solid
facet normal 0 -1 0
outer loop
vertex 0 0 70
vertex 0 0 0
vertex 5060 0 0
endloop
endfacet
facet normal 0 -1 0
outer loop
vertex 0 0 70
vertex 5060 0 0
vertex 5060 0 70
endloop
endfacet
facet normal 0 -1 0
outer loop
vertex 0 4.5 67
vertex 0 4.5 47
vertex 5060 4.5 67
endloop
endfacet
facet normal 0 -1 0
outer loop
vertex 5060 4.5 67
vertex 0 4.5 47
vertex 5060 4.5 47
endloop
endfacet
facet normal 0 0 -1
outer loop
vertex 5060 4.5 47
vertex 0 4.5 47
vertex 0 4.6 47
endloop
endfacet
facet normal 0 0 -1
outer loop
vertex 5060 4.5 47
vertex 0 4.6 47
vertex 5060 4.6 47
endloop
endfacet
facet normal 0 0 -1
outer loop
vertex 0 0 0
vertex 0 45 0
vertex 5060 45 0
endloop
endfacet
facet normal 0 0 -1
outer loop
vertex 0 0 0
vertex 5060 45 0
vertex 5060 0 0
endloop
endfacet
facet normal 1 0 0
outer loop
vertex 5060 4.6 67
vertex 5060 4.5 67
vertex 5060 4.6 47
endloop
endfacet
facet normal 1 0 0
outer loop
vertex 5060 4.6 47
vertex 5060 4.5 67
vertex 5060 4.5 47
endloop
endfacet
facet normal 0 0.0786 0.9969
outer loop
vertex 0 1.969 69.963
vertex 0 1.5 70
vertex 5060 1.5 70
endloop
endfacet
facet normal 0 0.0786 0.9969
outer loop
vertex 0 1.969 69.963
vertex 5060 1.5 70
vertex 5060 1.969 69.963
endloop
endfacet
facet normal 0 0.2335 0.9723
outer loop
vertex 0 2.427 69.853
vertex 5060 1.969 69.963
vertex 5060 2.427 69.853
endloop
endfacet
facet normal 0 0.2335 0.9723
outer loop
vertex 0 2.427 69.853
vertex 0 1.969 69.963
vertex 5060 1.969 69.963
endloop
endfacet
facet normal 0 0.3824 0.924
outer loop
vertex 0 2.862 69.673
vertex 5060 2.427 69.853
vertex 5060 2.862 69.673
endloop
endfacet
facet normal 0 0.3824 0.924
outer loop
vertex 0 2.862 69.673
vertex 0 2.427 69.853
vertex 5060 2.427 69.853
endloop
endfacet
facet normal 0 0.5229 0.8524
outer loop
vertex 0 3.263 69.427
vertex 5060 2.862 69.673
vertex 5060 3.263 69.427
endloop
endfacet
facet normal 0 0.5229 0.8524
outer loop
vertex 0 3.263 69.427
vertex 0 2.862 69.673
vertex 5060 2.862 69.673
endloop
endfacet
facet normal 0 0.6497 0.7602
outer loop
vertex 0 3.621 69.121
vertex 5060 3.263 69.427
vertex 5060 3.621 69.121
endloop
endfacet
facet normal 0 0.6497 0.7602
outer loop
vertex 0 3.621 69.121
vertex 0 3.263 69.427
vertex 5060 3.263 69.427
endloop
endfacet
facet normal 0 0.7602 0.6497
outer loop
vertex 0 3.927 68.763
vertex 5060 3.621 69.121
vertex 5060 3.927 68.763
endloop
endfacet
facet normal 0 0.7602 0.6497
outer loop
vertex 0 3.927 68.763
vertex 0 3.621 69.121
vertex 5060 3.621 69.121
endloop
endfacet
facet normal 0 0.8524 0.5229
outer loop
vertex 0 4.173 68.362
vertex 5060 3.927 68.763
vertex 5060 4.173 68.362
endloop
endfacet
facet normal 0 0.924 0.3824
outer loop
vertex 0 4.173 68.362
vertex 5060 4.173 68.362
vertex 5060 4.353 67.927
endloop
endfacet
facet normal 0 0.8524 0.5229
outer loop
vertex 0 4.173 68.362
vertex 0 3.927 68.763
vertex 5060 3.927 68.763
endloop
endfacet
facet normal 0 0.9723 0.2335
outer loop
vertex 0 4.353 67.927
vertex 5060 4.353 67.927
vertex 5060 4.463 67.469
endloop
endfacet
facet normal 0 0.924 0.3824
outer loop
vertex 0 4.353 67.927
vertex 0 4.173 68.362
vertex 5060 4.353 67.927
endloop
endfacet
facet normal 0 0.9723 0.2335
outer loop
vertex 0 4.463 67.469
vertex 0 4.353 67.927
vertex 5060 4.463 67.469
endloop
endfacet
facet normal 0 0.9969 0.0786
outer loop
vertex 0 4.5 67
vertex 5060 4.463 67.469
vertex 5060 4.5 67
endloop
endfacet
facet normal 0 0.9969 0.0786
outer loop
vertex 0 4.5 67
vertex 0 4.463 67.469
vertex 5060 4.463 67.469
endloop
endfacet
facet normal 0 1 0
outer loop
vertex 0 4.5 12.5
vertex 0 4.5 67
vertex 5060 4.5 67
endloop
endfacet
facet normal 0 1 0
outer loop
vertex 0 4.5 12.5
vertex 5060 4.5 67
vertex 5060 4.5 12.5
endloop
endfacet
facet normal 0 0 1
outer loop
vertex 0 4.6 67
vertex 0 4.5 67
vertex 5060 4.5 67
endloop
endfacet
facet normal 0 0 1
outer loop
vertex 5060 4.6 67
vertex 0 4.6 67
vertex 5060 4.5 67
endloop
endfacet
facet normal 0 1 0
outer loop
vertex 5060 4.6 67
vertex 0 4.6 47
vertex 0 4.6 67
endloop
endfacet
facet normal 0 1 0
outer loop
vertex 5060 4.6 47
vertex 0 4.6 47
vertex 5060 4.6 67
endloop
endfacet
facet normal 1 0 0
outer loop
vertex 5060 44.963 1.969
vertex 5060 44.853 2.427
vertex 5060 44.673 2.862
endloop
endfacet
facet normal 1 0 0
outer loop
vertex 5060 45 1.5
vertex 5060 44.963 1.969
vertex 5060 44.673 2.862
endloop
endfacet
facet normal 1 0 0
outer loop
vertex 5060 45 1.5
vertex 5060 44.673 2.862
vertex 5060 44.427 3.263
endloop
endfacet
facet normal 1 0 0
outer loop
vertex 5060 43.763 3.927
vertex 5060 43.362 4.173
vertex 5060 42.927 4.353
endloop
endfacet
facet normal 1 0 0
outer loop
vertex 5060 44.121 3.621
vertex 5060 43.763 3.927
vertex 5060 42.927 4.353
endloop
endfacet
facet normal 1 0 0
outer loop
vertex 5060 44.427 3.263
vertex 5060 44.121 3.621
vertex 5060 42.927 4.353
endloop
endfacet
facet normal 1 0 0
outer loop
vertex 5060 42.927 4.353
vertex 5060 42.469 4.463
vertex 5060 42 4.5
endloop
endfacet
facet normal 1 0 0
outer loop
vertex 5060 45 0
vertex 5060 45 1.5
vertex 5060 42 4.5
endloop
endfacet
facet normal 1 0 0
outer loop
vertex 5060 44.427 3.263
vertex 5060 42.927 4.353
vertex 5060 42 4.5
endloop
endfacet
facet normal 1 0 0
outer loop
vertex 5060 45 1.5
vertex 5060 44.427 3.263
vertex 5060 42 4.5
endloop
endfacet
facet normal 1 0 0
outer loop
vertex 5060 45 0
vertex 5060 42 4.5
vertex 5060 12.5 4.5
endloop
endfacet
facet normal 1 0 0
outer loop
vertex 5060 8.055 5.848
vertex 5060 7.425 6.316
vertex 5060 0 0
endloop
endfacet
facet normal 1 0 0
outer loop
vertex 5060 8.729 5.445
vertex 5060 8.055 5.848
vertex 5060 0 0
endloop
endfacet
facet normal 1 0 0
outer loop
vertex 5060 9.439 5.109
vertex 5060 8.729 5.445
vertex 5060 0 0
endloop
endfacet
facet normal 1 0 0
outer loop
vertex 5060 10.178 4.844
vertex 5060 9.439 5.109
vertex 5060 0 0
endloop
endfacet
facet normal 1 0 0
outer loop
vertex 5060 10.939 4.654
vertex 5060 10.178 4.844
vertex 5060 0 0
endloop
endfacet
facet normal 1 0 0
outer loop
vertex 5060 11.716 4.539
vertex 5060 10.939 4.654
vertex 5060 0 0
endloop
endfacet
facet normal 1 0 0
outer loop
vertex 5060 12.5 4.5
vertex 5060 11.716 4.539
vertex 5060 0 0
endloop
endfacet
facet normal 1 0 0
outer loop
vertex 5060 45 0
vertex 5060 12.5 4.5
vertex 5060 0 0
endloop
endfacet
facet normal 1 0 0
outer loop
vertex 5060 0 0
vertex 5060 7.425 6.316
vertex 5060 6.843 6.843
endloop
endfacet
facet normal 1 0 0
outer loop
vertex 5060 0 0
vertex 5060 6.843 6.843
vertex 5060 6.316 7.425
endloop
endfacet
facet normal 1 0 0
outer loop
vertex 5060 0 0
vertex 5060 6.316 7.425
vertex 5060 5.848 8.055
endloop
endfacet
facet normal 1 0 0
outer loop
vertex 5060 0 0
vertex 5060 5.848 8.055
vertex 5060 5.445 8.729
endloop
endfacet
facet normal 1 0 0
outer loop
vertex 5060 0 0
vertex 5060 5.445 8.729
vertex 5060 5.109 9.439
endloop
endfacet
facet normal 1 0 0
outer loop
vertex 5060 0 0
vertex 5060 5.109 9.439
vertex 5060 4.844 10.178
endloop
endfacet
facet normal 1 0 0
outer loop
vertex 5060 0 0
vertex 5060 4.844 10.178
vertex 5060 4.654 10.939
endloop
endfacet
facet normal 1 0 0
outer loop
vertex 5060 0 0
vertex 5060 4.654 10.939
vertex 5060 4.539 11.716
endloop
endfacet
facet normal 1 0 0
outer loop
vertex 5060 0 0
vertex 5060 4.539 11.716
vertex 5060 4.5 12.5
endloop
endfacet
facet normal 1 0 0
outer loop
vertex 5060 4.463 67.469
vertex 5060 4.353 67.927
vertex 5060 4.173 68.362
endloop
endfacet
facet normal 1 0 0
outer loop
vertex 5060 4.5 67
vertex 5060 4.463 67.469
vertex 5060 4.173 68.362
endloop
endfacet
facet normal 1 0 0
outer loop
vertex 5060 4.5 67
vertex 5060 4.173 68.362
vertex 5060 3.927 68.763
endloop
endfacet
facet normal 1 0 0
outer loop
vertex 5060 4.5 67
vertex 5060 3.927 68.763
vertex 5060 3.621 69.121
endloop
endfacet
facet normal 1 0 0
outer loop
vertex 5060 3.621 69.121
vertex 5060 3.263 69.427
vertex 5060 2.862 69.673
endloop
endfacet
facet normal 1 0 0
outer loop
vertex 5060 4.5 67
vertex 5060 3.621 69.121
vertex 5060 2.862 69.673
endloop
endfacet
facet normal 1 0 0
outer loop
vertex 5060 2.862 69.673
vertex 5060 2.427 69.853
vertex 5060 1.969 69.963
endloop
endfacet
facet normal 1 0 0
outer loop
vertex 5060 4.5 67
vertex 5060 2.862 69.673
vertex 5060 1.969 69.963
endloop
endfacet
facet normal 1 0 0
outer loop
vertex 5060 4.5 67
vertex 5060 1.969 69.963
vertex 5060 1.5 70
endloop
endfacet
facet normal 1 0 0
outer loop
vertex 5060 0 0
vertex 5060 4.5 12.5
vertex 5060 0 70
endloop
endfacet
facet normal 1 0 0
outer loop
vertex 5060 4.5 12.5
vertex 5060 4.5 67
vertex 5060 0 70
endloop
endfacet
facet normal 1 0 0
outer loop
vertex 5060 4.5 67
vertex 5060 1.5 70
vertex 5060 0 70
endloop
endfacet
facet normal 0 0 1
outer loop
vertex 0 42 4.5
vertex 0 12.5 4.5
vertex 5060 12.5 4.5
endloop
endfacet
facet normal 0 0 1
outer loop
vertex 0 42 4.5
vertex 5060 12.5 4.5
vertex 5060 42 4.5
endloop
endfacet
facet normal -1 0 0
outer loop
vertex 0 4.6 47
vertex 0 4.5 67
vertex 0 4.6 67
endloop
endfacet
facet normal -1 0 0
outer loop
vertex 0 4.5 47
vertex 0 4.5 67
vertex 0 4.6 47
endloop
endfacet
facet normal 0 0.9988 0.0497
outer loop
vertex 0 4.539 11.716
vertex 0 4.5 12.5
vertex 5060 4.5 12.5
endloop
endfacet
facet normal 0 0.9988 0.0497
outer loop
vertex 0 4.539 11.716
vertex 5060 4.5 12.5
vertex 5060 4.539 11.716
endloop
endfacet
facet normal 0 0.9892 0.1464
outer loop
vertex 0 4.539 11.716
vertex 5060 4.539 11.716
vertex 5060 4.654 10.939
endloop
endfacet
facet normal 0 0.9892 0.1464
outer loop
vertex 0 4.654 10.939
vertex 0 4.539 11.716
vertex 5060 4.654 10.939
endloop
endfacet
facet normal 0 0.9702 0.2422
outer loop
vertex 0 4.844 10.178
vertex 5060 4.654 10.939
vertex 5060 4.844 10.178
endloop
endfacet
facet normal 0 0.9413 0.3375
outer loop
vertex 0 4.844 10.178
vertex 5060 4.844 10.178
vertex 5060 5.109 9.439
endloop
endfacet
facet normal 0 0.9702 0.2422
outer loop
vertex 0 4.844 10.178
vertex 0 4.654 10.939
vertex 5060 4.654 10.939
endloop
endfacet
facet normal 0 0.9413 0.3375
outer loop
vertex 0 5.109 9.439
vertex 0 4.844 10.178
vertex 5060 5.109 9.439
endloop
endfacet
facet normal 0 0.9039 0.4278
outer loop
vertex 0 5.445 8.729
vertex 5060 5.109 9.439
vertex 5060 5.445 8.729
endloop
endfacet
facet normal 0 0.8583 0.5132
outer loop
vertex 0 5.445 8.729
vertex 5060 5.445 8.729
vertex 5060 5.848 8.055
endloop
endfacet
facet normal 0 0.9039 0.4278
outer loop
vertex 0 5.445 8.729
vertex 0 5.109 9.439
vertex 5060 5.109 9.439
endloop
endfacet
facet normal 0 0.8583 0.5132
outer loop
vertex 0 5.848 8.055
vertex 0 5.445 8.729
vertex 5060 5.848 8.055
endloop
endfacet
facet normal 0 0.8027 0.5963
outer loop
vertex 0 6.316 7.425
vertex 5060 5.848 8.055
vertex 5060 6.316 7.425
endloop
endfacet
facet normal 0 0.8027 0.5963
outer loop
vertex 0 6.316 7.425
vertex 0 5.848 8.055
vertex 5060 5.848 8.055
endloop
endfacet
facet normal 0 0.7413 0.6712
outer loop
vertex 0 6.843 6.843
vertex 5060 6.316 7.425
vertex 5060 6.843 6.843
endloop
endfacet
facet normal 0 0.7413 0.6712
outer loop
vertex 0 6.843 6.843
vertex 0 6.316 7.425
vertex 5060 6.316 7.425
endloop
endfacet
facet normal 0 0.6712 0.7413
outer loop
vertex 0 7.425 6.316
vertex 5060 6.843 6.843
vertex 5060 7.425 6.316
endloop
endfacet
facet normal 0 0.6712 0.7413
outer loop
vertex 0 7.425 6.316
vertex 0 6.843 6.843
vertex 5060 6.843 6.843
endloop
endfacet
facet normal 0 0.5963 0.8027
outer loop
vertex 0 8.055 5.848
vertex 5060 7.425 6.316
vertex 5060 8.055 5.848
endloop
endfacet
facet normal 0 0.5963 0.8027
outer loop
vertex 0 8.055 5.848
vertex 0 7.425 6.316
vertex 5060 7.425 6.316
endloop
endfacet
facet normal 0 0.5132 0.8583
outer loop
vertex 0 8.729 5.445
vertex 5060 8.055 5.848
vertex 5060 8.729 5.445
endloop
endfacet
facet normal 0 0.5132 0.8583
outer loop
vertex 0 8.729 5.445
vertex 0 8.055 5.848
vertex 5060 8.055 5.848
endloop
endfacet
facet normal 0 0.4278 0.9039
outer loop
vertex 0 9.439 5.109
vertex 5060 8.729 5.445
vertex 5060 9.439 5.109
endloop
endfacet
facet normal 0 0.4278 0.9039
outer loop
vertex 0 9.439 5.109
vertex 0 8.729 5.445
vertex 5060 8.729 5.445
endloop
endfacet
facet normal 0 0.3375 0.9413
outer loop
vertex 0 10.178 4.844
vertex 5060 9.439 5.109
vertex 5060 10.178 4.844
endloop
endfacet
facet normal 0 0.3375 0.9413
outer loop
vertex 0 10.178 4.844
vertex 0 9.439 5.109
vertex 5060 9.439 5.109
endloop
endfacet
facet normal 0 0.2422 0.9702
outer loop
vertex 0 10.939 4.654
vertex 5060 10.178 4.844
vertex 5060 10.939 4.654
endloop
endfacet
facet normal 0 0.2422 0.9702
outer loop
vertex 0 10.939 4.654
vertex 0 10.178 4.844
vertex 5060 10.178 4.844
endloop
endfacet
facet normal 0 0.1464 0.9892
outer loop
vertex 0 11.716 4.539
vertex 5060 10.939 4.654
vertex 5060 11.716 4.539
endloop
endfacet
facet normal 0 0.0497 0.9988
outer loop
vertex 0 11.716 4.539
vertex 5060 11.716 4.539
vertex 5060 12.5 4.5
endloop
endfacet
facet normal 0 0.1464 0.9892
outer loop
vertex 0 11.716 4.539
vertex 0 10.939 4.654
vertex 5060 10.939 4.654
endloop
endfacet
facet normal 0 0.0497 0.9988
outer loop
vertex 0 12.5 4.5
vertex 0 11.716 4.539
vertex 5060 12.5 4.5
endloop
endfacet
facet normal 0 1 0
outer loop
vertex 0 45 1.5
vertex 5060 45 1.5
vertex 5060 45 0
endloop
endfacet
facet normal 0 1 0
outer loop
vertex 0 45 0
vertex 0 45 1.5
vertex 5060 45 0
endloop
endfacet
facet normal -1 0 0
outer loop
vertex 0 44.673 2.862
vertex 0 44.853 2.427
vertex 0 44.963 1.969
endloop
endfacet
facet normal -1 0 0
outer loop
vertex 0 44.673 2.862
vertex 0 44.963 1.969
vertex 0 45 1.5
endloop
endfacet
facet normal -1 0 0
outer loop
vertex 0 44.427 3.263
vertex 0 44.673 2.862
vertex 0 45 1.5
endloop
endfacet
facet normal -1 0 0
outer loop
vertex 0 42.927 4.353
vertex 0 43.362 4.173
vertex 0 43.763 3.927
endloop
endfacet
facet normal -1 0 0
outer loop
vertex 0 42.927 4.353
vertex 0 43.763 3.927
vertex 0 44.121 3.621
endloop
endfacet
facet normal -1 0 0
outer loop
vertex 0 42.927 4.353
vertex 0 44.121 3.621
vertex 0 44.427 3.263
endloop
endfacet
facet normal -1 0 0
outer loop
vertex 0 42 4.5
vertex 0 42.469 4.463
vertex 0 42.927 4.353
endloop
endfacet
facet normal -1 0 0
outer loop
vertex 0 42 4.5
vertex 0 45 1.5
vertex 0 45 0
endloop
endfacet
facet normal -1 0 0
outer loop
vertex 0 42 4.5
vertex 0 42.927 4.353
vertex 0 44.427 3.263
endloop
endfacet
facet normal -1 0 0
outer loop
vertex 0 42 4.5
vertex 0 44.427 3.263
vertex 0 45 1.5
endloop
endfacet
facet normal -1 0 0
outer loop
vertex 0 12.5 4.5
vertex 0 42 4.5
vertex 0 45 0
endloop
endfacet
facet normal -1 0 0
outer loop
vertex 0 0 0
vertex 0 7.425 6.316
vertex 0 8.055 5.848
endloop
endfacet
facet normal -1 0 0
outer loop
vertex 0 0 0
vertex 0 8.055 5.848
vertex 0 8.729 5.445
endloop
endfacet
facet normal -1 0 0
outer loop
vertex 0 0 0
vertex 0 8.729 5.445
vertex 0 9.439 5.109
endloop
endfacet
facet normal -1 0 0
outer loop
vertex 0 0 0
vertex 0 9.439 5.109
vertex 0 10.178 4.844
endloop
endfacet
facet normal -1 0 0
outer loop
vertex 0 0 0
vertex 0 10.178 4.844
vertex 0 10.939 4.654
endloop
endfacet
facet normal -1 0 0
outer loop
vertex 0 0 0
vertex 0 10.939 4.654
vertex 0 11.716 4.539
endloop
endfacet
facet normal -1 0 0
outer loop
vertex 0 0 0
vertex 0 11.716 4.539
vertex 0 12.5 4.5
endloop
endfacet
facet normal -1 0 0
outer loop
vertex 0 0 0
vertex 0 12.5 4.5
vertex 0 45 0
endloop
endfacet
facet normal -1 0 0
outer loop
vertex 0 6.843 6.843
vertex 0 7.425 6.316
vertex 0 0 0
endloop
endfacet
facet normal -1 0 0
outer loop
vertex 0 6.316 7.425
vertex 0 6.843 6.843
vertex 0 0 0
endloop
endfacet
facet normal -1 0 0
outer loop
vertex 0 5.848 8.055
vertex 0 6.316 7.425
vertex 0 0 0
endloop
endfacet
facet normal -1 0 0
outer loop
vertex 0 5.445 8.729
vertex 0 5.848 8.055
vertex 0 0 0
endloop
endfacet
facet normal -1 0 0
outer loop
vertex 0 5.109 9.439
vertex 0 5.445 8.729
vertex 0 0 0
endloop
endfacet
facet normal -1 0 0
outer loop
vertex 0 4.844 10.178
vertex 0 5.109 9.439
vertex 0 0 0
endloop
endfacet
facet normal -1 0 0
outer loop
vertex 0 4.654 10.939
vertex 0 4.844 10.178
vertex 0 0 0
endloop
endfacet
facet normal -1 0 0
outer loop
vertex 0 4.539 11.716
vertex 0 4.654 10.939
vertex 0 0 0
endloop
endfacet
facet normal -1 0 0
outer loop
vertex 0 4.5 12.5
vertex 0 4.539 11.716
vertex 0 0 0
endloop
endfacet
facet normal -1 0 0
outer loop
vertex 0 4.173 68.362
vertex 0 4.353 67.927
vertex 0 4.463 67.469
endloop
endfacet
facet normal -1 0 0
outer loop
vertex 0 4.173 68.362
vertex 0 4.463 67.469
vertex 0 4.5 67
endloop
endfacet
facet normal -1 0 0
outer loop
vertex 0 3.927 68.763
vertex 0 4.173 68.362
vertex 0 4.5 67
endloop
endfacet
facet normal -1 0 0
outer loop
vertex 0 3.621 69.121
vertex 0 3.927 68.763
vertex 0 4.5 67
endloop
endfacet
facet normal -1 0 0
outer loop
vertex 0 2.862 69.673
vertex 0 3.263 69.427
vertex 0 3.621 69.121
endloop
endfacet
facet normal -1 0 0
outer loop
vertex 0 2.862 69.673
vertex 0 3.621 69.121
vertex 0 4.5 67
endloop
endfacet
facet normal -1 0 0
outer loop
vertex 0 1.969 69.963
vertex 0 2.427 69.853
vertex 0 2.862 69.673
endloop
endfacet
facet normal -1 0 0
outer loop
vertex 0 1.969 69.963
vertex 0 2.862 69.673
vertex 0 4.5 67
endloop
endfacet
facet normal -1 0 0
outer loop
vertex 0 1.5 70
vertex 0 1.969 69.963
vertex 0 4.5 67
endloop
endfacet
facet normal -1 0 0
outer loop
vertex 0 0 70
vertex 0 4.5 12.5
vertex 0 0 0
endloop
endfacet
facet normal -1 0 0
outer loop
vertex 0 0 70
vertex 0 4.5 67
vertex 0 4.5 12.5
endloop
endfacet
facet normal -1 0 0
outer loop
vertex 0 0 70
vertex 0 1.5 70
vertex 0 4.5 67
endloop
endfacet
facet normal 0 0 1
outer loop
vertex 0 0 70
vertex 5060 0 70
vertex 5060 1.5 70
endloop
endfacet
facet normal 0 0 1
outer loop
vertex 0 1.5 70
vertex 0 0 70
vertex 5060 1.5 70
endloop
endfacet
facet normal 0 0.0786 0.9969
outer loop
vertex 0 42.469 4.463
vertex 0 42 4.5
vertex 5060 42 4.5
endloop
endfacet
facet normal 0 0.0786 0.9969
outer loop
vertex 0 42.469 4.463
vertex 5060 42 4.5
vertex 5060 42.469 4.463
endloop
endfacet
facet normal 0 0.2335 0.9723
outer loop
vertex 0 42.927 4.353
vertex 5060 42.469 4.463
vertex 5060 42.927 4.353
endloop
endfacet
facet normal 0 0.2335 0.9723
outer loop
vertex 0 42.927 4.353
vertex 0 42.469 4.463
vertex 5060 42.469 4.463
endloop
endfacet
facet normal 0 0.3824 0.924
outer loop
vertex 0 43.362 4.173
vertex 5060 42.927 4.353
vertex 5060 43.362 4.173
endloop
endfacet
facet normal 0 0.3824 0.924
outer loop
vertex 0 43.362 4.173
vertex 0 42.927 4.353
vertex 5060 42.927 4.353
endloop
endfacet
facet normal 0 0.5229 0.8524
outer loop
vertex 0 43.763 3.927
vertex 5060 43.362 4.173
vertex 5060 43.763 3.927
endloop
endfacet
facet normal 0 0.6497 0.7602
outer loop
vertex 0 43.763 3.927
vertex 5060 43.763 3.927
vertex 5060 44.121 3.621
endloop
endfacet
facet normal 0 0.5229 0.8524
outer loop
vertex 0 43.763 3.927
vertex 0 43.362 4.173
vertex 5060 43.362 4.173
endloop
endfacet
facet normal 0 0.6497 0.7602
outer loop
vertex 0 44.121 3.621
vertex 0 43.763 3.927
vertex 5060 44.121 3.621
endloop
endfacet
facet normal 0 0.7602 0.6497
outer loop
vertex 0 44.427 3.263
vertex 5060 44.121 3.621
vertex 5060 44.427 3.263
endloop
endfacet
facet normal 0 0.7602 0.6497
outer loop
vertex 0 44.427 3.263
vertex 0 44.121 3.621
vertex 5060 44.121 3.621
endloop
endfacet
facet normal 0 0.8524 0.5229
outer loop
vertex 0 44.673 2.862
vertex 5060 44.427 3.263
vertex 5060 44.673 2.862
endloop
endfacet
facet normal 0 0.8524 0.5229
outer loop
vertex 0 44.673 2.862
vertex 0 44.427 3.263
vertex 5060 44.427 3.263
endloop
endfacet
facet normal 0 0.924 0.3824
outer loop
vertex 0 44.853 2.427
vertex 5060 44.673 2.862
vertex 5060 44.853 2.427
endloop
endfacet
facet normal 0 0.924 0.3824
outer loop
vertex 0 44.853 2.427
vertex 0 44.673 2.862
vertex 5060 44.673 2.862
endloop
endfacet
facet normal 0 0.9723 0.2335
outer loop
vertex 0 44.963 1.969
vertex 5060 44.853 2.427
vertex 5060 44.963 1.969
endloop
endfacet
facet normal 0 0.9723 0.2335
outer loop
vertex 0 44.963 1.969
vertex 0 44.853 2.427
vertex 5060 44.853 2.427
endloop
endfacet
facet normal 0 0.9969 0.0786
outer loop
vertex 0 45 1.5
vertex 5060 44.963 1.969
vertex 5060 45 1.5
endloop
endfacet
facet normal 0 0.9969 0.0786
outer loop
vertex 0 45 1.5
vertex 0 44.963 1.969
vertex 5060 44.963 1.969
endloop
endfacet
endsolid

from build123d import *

# Parameters (mm, degrees)
ANGLE_IRON_70X45X4_5_1_DEPTH = 5060
SKETCH12_W                   = 5060
SKETCH12_H                   = 20
BOSS_EXTRUDE1_DEPTH          = 0.1


with BuildPart() as part:
    # Sketch11 → Angle iron 70X45X4.5(1) (new body)
    with BuildSketch(Plane.YZ):
        with BuildLine():
            Line((0, 0), (0, 70))
            Line((0, 70), (1.5, 70))
            ThreePointArc((1.5, 70), (3.621320344, 69.121320344), (4.5, 67))
            Line((4.5, 67), (4.5, 12.5))
            ThreePointArc((4.5, 12.5), (6.843145751, 6.843145751), (12.5, 4.5))
            Line((12.5, 4.5), (42, 4.5))
            ThreePointArc((42, 4.5), (44.121320344, 3.621320344), (45, 1.5))
            Line((45, 1.5), (45, 0))
            Line((45, 0), (0, 0))
        make_face()
    extrude(amount=ANGLE_IRON_70X45X4_5_1_DEPTH)


with BuildPart() as body_2:
    # Sketch12 → Boss-Extrude1 (new body)
    with BuildSketch(Plane(origin=(0, 4.5, 0), x_dir=(1, 0, 0), z_dir=(0, 1, 0))):
        with Locations((2530, -57)):
            Rectangle(SKETCH12_W, SKETCH12_H)
    extrude(amount=BOSS_EXTRUDE1_DEPTH)


solid = Compound([part.part, body_2.part])
